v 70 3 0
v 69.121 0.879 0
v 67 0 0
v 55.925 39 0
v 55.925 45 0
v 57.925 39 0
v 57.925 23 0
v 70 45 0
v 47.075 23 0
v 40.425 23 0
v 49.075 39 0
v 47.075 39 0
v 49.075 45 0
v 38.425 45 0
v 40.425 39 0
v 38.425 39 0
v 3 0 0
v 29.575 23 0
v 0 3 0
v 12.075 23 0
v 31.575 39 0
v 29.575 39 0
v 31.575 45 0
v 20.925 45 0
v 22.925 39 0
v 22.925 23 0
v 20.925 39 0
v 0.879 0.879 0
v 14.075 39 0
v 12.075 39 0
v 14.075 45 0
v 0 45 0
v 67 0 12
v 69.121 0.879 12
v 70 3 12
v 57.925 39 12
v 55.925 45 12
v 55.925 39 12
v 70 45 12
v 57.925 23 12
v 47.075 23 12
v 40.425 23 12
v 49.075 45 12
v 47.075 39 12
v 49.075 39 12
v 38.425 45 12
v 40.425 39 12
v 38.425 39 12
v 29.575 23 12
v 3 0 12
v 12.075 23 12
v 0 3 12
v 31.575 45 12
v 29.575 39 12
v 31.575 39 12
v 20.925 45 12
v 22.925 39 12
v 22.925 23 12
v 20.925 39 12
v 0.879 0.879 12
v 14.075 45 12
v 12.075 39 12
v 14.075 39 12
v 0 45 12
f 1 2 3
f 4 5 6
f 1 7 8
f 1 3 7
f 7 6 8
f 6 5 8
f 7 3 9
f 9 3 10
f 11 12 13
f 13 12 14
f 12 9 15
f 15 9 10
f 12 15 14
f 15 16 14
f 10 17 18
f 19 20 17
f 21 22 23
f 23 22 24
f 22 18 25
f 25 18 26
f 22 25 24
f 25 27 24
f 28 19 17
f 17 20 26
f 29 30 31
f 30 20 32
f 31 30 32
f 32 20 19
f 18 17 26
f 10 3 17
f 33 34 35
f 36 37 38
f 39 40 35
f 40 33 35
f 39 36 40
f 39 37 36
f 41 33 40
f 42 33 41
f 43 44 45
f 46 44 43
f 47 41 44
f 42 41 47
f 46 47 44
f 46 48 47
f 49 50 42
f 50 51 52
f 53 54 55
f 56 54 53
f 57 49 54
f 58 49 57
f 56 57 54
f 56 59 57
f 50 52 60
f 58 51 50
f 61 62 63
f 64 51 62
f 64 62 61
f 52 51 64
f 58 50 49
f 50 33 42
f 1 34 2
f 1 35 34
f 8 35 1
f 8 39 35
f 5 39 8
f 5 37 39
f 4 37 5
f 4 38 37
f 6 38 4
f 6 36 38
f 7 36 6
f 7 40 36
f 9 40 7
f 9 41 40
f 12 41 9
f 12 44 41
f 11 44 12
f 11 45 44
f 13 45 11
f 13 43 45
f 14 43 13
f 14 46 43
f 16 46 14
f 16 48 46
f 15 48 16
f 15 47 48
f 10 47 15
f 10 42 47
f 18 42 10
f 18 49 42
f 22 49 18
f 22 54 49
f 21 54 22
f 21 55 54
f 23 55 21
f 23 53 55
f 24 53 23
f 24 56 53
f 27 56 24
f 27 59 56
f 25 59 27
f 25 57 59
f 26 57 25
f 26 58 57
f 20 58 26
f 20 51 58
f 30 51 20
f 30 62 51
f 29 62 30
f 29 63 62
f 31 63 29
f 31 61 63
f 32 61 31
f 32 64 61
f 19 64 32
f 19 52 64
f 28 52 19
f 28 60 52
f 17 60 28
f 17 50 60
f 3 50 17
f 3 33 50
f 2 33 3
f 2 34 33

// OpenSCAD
$fn = 32;

// ----------------------------------------------------------------------
// Window plate: 70 x 45 mm, 3 open windows
// ----------------------------------------------------------------------

// --- parameters (mm) ---
profile_height = 12;      // extrusion height
profile_points = 32;      // points of the closed outline

profile = [[0, 3], [0.879, 0.879], [3, 0], [67, 0], [69.121, 0.879], [70, 3], [70, 45], [55.925, 45], [55.925, 39], [57.925, 39], [57.925, 23], [47.075, 23], [47.075, 39], [49.075, 39], [49.075, 45], [38.425, 45], [38.425, 39], [40.425, 39], [40.425, 23], [29.575, 23], [29.575, 39], [31.575, 39], [31.575, 45], [20.925, 45], [20.925, 39], [22.925, 39], [22.925, 23], [12.075, 23], [12.075, 39], [14.075, 39], [14.075, 45], [0, 45]];  // single closed polygon, 32 points, counter clockwise

// --- the one profile operation ---
linear_extrude(height = profile_height) polygon(points = profile);
